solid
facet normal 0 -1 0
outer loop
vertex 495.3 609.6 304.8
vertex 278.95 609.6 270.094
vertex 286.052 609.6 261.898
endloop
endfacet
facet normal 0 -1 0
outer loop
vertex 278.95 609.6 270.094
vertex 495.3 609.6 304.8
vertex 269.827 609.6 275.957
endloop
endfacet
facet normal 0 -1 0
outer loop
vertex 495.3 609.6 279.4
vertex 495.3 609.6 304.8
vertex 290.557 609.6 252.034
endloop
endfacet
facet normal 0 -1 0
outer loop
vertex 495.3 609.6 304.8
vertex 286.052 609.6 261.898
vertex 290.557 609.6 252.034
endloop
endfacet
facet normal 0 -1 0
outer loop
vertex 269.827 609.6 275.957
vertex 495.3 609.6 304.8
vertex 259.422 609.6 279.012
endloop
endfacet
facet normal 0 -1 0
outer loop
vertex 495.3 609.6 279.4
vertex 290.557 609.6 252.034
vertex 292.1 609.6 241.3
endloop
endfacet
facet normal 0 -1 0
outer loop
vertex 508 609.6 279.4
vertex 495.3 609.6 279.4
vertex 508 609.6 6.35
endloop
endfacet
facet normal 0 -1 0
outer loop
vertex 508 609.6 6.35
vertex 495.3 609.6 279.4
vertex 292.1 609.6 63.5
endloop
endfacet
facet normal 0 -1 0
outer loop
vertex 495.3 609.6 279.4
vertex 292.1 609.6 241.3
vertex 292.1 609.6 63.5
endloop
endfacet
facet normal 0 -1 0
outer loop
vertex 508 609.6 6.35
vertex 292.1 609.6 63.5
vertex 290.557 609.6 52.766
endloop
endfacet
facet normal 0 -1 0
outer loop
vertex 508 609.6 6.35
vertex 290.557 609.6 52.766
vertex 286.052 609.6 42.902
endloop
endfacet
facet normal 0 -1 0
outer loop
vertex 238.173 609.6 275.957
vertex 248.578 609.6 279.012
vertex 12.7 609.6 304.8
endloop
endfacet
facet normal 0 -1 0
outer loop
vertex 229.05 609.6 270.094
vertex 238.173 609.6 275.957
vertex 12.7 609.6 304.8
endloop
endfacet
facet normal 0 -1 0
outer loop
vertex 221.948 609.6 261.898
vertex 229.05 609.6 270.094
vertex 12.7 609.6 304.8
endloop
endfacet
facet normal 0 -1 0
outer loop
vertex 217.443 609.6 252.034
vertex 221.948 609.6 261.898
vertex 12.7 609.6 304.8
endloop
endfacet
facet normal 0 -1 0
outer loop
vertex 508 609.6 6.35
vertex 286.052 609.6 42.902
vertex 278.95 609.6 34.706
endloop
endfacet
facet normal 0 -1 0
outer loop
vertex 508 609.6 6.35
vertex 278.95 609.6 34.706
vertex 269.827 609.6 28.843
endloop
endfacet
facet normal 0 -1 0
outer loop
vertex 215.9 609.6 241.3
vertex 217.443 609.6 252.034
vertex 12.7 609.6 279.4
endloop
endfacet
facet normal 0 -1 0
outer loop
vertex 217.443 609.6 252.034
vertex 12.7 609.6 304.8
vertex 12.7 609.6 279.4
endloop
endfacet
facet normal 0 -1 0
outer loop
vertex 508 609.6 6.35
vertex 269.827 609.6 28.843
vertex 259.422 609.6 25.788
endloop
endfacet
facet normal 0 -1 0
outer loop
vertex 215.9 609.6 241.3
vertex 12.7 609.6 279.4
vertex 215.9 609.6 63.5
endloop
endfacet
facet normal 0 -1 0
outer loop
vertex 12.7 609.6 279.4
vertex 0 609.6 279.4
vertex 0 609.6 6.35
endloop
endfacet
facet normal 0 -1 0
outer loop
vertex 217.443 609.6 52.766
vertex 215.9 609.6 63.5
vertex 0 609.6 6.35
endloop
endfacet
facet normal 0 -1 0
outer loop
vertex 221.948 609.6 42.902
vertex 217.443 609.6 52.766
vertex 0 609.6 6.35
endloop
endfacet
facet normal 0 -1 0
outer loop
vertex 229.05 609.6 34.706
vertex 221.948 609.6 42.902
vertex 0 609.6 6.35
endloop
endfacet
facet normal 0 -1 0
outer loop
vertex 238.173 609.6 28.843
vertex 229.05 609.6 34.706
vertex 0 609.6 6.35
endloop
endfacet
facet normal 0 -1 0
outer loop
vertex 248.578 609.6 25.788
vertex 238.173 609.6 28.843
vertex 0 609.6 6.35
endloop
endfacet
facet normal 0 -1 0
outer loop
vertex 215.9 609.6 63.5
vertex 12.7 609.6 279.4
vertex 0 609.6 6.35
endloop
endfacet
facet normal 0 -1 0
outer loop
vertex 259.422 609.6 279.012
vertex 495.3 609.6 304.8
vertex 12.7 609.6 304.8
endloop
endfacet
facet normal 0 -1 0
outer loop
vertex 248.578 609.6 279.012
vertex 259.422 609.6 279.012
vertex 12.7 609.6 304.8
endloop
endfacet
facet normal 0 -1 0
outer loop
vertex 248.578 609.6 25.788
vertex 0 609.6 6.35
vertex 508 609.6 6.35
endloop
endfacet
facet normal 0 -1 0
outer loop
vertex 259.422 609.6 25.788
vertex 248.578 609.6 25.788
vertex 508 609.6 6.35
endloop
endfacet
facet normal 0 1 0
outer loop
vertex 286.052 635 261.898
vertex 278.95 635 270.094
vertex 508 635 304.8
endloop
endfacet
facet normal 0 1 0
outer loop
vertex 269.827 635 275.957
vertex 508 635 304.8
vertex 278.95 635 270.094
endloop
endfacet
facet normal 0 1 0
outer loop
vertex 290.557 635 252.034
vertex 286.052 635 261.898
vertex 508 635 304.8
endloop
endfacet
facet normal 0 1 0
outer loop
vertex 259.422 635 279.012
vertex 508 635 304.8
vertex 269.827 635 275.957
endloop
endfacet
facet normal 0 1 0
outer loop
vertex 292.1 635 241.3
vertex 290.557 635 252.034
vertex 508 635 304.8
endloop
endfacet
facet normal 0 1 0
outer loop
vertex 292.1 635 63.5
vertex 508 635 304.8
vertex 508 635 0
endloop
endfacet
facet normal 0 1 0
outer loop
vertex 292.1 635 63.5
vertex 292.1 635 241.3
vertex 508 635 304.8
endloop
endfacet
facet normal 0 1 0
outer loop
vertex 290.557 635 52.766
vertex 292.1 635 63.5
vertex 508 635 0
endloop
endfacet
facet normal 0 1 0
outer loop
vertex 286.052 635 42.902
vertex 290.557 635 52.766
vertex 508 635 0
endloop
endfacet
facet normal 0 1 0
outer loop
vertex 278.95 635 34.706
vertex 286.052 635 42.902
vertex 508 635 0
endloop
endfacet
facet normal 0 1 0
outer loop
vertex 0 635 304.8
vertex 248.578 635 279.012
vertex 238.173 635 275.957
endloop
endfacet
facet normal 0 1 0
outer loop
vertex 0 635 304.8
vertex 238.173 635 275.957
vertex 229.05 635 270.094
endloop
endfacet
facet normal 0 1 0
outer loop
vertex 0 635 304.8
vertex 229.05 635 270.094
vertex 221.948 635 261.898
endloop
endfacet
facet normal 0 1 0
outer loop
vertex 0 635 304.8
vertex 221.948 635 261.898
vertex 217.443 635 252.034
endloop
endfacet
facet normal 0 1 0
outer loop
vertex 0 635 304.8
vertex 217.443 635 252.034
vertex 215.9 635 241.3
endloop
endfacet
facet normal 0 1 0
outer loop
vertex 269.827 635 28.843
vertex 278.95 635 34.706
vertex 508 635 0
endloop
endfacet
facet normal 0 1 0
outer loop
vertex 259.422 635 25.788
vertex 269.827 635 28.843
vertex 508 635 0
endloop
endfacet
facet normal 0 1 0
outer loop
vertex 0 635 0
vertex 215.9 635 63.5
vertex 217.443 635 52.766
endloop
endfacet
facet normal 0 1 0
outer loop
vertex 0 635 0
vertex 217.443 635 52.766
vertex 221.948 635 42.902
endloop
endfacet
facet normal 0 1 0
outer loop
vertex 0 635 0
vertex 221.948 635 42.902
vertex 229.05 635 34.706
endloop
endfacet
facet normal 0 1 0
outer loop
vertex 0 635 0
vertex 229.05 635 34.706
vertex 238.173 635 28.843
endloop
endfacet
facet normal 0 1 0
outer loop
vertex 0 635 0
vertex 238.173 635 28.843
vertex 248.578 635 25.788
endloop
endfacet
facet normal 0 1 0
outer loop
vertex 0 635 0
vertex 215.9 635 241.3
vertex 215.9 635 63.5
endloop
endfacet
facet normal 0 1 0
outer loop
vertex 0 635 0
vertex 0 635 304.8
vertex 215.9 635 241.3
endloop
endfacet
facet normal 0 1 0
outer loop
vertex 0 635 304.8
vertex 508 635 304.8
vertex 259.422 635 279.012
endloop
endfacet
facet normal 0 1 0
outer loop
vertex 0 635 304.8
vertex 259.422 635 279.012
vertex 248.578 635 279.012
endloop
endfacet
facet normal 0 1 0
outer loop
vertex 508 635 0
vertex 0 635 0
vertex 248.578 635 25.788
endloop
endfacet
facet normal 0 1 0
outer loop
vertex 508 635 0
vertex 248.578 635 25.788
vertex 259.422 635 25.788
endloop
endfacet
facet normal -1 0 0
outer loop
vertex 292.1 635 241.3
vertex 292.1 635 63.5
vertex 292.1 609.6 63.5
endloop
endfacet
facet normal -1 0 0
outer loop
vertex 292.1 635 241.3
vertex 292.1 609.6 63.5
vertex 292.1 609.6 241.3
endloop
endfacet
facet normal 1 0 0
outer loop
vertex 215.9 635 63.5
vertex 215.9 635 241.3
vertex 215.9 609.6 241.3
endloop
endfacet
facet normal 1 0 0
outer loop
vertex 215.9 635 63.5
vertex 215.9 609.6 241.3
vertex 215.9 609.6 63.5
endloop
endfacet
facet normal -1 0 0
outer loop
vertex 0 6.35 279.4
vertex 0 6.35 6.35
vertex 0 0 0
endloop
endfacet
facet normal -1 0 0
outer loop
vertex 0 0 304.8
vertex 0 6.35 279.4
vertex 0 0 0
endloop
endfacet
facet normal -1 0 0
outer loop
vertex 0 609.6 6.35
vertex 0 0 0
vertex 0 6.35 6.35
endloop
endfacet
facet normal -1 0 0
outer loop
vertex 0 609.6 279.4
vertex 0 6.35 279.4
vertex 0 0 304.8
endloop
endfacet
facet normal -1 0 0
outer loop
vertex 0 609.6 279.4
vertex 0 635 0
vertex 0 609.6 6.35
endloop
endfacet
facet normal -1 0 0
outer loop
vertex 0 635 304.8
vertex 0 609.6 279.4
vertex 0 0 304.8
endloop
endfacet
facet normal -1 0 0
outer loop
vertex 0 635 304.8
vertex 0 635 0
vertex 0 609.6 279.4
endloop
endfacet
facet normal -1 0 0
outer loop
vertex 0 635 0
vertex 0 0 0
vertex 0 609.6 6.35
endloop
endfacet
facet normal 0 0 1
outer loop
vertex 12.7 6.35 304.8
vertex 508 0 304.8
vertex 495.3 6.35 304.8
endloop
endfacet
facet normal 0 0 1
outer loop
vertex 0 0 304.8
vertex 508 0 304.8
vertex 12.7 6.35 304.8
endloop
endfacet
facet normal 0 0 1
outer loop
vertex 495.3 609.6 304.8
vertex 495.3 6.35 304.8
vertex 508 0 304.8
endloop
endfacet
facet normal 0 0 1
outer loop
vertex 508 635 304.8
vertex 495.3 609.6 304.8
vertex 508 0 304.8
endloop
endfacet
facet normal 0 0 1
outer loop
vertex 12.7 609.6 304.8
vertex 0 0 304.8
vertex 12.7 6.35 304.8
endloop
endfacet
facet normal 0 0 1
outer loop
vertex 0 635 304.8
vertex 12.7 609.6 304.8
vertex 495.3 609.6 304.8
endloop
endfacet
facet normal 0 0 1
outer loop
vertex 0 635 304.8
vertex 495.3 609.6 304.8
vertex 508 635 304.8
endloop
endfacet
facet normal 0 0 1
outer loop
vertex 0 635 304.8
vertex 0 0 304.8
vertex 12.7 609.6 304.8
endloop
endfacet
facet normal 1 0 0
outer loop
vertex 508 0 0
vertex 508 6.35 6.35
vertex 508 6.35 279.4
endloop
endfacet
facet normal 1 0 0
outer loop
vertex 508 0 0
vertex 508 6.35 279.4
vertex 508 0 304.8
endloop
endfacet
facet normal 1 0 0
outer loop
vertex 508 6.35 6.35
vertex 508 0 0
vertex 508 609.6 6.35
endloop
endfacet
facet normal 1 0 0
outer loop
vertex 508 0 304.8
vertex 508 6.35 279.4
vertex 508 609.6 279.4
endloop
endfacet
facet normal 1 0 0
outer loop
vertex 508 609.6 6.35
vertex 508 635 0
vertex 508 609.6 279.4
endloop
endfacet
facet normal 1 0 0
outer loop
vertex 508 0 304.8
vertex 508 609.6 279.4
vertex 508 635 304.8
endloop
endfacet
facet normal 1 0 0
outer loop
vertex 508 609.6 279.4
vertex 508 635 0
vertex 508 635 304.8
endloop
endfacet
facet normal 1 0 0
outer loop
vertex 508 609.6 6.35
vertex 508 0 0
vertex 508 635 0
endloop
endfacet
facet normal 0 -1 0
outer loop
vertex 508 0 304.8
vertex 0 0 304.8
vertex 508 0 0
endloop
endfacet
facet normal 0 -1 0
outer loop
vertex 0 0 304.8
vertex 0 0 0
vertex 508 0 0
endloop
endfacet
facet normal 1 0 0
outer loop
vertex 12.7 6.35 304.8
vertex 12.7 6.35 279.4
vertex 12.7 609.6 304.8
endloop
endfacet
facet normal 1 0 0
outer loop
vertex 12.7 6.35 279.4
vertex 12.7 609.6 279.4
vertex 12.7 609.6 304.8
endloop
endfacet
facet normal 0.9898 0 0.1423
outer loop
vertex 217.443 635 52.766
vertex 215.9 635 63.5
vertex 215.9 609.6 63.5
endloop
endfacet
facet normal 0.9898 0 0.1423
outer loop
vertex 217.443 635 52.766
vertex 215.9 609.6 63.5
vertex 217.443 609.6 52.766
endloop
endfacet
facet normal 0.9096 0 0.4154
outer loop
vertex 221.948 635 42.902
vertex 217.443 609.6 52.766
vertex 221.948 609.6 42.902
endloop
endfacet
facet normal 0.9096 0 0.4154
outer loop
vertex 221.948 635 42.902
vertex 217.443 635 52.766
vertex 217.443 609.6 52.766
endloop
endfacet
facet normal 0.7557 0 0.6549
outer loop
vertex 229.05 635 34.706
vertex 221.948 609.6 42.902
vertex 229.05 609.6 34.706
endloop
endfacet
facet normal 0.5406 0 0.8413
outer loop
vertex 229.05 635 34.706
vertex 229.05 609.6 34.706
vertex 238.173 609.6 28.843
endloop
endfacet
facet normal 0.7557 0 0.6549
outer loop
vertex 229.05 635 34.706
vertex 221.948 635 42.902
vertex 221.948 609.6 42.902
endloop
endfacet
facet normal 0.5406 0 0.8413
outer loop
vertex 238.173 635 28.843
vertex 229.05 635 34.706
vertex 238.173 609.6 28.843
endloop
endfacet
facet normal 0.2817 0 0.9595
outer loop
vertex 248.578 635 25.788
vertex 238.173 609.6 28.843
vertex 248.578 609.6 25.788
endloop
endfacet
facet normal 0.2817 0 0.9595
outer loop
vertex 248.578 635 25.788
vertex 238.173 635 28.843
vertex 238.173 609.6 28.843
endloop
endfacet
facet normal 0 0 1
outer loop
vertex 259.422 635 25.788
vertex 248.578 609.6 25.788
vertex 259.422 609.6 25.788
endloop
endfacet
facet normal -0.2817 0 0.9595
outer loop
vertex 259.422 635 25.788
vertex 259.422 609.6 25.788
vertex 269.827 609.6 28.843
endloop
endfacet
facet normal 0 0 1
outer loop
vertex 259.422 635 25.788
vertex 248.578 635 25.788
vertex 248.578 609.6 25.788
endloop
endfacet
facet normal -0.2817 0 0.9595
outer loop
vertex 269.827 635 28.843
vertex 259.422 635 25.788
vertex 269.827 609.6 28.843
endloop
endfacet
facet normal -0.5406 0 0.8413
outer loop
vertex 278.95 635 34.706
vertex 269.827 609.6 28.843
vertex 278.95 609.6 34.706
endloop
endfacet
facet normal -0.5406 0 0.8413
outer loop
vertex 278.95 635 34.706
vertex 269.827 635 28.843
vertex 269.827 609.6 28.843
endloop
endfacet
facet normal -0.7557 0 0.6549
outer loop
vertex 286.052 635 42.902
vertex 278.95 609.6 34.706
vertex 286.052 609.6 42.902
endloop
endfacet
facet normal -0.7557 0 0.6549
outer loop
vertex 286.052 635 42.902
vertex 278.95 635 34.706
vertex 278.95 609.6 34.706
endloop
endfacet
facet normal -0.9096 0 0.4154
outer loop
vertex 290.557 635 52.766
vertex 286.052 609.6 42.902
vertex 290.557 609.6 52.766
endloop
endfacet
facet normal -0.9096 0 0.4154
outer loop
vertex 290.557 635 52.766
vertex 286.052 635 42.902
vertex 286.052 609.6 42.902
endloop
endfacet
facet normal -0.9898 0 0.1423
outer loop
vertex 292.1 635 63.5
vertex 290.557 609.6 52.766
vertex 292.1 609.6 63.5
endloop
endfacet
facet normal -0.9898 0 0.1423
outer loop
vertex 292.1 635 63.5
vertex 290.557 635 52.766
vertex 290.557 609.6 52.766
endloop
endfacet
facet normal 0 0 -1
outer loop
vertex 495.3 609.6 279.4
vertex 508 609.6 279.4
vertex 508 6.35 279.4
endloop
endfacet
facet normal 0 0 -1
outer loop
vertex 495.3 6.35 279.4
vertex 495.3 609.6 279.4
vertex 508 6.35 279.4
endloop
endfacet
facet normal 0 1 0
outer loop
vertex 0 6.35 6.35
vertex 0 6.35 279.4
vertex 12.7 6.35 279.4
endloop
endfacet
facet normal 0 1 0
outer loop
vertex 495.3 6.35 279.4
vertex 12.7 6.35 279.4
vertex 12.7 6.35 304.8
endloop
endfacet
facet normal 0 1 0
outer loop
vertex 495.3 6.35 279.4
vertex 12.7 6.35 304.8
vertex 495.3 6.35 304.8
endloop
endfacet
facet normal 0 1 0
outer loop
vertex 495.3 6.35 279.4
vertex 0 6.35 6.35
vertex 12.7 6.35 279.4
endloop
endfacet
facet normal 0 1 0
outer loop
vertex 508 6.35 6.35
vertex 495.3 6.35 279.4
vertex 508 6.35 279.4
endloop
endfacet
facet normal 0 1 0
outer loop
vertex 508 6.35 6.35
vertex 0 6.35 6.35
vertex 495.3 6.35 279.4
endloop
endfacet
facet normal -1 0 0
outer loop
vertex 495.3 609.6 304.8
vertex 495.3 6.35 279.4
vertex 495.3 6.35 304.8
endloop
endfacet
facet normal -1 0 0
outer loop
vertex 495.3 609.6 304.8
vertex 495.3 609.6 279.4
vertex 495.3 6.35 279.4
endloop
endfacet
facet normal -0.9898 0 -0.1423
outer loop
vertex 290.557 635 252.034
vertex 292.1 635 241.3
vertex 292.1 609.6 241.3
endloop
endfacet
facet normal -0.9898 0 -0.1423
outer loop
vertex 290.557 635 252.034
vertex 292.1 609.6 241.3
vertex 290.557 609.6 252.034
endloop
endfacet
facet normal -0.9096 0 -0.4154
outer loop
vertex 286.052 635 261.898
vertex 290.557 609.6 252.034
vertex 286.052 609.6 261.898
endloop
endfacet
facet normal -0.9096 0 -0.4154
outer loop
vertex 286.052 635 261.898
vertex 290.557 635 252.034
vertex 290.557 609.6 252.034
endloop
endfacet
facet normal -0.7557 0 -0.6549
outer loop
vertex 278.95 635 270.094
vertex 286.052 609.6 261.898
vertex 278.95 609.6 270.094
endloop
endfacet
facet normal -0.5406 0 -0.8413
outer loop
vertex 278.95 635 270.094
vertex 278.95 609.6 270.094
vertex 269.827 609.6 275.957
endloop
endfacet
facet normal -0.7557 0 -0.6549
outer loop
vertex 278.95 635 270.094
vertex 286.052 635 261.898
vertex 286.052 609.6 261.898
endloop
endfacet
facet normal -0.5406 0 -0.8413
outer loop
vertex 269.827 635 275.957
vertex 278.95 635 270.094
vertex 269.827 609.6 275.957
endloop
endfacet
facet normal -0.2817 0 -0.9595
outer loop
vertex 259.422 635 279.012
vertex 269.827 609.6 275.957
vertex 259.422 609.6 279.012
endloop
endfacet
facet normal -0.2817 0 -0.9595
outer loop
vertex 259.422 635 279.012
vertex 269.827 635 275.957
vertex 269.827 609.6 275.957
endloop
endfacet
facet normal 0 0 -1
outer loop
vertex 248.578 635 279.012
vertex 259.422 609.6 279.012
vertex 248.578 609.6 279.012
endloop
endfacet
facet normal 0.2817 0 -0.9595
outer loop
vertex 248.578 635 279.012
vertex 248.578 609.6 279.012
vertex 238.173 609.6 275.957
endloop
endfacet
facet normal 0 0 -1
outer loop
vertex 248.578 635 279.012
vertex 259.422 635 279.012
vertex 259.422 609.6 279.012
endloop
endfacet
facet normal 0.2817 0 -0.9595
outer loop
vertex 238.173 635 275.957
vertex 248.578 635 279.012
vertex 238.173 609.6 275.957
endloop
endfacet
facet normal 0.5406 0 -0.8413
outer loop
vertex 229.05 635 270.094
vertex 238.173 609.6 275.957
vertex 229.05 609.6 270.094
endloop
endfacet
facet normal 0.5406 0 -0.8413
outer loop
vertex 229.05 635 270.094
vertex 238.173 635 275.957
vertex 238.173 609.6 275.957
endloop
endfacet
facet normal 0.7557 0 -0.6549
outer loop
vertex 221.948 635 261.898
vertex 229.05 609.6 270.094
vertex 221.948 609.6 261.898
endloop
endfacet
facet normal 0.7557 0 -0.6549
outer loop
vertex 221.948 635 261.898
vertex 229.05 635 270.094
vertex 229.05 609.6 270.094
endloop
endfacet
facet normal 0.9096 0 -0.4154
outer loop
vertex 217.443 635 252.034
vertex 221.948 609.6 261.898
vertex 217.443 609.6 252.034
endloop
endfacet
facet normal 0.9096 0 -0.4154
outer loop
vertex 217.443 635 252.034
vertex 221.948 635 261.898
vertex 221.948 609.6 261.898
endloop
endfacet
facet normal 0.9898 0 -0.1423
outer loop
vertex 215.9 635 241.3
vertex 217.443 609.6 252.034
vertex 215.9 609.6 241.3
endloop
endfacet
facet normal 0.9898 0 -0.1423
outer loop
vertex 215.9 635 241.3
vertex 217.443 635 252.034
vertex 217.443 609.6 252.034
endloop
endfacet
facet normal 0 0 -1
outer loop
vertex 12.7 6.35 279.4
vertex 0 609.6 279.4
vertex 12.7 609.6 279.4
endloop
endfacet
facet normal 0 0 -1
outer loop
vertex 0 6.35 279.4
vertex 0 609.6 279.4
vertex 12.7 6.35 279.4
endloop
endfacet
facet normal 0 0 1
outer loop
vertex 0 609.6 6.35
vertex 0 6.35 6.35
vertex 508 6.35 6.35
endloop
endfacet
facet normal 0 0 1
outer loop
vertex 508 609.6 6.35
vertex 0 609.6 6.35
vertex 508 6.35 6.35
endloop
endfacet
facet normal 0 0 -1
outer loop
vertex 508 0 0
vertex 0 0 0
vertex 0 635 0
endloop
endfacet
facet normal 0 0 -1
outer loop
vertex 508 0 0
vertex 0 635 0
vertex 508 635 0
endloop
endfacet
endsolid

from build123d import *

# Parameters (mm, degrees)
SKETCH1_W           = 508
SKETCH1_H           = 635
BOSS_EXTRUDE1_DEPTH = 6.35
SKETCH3_W           = 508
SKETCH3_H           = 298.45
BOSS_EXTRUDE3_DEPTH = 6.35
BOSS_EXTRUDE4_DEPTH = 12.7
SKETCH6_W           = 298.45
SKETCH6_H           = 25.4
BOSS_EXTRUDE6_DEPTH = 482.6
CUT_EXTRUDE1_DEPTH  = 25.4


with BuildPart() as part:
    # Sketch1 → Boss-Extrude1 (new body)
    with BuildSketch(Plane.XY):
        with Locations((254, 317.5)):
            Rectangle(SKETCH1_W, SKETCH1_H)
    extrude(amount=BOSS_EXTRUDE1_DEPTH)

    # Sketch3 → Boss-Extrude3 (add)
    with BuildSketch(Plane(origin=(0, 0, 0), x_dir=(1, 0, 0), z_dir=(0, 1, 0))):
        with Locations((254, -155.575)):
            Rectangle(SKETCH3_W, SKETCH3_H)
    extrude(amount=BOSS_EXTRUDE3_DEPTH)

    # Sketch4 → Boss-Extrude4 (add)
    with BuildSketch(Plane(origin=(0, 0, 0), x_dir=(0, 0, -1), z_dir=(1, 0, 0))):
        Polygon((-304.8, 6.35), (-304.8, 635), (-6.35, 635), (-6.35, 609.6), (-279.4, 609.6), (-279.4, 6.35), align=None)
    boss_extrude4 = extrude(amount=BOSS_EXTRUDE4_DEPTH)

    # Mirror1: Boss-Extrude4 across plane
    add(boss_extrude4.mirror(Plane(origin=(254, 0, 0), x_dir=(0, 0, 1), z_dir=(1, 0, 0))))

    # Sketch6 → Boss-Extrude6 (add)
    with BuildSketch(Plane(origin=(12.7, 0, 0), x_dir=(0, 0, -1), z_dir=(1, 0, 0))):
        with Locations((-155.575, 622.3)):
            Rectangle(SKETCH6_W, SKETCH6_H)
    extrude(amount=BOSS_EXTRUDE6_DEPTH)

    # Sketch7 → Cut-Extrude1 (cut)
    with BuildSketch(Plane(origin=(0, 635, 0), x_dir=(1, 0, 0), z_dir=(0, 1, 0))):
        with BuildLine():
            Line((292.1, -63.5), (292.1, -241.3))
            ThreePointArc((292.1, -241.3), (254, -279.4), (215.9, -241.3))
            Line((215.9, -241.3), (215.9, -63.5))
            ThreePointArc((215.9, -63.5), (254, -25.4), (292.1, -63.5))
        make_face()
    extrude(amount=-CUT_EXTRUDE1_DEPTH, mode=Mode.SUBTRACT)


solid = part.part
